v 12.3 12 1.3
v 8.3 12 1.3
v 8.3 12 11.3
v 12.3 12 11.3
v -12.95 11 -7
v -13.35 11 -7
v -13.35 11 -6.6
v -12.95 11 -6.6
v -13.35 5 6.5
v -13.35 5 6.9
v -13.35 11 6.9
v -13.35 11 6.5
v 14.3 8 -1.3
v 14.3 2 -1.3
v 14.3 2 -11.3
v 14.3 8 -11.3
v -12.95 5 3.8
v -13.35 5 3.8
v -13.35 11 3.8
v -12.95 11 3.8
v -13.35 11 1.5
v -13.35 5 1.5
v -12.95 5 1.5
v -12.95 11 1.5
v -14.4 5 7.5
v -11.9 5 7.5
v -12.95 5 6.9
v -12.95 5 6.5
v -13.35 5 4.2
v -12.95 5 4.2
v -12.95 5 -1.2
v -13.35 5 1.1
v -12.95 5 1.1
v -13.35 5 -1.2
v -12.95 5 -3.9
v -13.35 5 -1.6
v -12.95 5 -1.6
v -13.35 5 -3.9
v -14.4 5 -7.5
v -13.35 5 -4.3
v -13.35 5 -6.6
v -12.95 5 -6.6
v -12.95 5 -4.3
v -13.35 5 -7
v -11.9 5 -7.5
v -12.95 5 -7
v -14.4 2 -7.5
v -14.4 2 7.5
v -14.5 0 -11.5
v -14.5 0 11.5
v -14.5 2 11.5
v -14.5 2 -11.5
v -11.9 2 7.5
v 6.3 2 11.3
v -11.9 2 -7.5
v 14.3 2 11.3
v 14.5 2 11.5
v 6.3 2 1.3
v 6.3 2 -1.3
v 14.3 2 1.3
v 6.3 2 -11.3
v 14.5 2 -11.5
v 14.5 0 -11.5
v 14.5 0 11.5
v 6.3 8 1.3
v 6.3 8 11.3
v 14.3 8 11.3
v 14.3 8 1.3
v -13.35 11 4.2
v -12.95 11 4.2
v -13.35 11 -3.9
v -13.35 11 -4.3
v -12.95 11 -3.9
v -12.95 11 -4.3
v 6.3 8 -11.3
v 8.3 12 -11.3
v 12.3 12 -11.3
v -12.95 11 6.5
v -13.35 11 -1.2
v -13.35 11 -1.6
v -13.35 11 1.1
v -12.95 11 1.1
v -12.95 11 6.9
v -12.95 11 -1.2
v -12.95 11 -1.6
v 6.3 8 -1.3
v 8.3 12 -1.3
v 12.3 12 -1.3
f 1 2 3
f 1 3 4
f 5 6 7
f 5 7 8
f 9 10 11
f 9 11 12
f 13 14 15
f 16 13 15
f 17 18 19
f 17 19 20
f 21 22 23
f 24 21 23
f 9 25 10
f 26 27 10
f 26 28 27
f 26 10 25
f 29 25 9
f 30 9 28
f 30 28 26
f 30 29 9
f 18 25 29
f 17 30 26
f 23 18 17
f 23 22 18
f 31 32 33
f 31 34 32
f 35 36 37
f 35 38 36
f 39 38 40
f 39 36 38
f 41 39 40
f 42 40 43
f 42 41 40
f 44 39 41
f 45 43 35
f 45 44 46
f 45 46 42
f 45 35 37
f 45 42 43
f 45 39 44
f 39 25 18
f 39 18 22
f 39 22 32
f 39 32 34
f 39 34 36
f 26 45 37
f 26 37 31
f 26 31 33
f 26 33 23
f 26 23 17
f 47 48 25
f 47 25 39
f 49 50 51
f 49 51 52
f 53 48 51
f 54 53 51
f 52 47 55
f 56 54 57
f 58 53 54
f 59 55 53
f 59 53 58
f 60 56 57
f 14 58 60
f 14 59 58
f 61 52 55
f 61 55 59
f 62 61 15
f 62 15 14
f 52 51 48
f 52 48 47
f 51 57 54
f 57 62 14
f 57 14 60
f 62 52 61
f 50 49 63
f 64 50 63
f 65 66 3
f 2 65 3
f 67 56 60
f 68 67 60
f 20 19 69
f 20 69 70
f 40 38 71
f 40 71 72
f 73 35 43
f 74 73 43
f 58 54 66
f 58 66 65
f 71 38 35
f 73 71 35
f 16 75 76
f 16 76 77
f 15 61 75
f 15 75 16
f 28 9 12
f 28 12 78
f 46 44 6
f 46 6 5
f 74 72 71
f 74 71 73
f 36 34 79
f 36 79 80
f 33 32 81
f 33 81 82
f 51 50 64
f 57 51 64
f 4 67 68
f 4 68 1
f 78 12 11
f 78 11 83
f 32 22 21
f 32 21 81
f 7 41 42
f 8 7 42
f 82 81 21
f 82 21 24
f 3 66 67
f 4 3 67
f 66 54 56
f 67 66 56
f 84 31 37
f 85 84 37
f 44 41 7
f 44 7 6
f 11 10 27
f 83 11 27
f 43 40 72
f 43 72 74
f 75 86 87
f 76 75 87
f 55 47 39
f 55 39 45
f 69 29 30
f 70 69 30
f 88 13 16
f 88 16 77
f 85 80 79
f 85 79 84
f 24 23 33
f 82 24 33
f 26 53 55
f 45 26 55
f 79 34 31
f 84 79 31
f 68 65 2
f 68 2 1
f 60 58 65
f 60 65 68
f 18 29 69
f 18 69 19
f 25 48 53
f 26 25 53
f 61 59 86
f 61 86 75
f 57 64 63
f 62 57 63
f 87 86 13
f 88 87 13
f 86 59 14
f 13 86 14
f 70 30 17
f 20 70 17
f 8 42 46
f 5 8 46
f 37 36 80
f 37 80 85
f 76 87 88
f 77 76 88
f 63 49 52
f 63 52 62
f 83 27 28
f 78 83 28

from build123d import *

# Parameters (mm, degrees)
SKETCH1_W           = 29
SKETCH1_H           = 23
BOSS_EXTRUDE1_DEPTH = 2
SKETCH2_W           = 8
SKETCH2_H           = 10
BOSS_EXTRUDE2_DEPTH = 10
CUT_EXTRUDE1_DEPTH  = 30.565013107
SKETCH5_W           = 2.5
SKETCH5_H           = 15
BOSS_EXTRUDE3_DEPTH = 3
SKETCH6_W           = 0.4
SKETCH6_H           = 0.4
BOSS_EXTRUDE4_DEPTH = 6


with BuildPart() as part:
    # Sketch1 → Boss-Extrude1 (new body)
    with BuildSketch(Plane(origin=(0, 0, 0), x_dir=(1, 0, 0), z_dir=(0, 1, 0))):
        Rectangle(SKETCH1_W, SKETCH1_H)
    extrude(amount=BOSS_EXTRUDE1_DEPTH)

    # Sketch2 → Boss-Extrude2 (add)
    with BuildSketch(Plane(origin=(0, 2, 0), x_dir=(1, 0, 0), z_dir=(0, 1, 0))):
        with Locations((10.3, -6.3)):
            Rectangle(SKETCH2_W, SKETCH2_H)
        with Locations((10.3, 6.3)):
            Rectangle(SKETCH2_W, SKETCH2_H)
    extrude(amount=BOSS_EXTRUDE2_DEPTH)

    # Sketch3 → Cut-Extrude1 (cut, through all)
    with BuildSketch(Plane.XY.offset(11.3)):
        Polygon((12.3, 12), (14.3, 12), (14.3, 8), align=None)
        Polygon((6.3, 12), (6.3, 8), (8.3, 12), align=None)
    extrude(amount=-CUT_EXTRUDE1_DEPTH, mode=Mode.SUBTRACT)

    # Sketch5 → Boss-Extrude3 (add)
    with BuildSketch(Plane(origin=(0, 2, 0), x_dir=(1, 0, 0), z_dir=(0, 1, 0))):
        with Locations((-13.15, 0)):
            Rectangle(SKETCH5_W, SKETCH5_H)
    extrude(amount=BOSS_EXTRUDE3_DEPTH)

    # Sketch6 → Boss-Extrude4 (add)
    with BuildSketch(Plane(origin=(0, 5, 0), x_dir=(1, 0, 0), z_dir=(0, 1, 0))):
        with Locations((-13.15, 6.8)):
            Rectangle(SKETCH6_W, SKETCH6_H)
        with Locations((-13.15, 4.1)):
            Rectangle(SKETCH6_W, SKETCH6_H)
        with Locations((-13.15, 1.4)):
            Rectangle(SKETCH6_W, SKETCH6_H)
        with Locations((-13.15, -1.3)):
            Rectangle(SKETCH6_W, SKETCH6_H)
        with Locations((-13.15, -4)):
            Rectangle(SKETCH6_W, SKETCH6_H)
        with Locations((-13.15, -6.7)):
            Rectangle(SKETCH6_W, SKETCH6_H)
    extrude(amount=BOSS_EXTRUDE4_DEPTH)


solid = part.part
